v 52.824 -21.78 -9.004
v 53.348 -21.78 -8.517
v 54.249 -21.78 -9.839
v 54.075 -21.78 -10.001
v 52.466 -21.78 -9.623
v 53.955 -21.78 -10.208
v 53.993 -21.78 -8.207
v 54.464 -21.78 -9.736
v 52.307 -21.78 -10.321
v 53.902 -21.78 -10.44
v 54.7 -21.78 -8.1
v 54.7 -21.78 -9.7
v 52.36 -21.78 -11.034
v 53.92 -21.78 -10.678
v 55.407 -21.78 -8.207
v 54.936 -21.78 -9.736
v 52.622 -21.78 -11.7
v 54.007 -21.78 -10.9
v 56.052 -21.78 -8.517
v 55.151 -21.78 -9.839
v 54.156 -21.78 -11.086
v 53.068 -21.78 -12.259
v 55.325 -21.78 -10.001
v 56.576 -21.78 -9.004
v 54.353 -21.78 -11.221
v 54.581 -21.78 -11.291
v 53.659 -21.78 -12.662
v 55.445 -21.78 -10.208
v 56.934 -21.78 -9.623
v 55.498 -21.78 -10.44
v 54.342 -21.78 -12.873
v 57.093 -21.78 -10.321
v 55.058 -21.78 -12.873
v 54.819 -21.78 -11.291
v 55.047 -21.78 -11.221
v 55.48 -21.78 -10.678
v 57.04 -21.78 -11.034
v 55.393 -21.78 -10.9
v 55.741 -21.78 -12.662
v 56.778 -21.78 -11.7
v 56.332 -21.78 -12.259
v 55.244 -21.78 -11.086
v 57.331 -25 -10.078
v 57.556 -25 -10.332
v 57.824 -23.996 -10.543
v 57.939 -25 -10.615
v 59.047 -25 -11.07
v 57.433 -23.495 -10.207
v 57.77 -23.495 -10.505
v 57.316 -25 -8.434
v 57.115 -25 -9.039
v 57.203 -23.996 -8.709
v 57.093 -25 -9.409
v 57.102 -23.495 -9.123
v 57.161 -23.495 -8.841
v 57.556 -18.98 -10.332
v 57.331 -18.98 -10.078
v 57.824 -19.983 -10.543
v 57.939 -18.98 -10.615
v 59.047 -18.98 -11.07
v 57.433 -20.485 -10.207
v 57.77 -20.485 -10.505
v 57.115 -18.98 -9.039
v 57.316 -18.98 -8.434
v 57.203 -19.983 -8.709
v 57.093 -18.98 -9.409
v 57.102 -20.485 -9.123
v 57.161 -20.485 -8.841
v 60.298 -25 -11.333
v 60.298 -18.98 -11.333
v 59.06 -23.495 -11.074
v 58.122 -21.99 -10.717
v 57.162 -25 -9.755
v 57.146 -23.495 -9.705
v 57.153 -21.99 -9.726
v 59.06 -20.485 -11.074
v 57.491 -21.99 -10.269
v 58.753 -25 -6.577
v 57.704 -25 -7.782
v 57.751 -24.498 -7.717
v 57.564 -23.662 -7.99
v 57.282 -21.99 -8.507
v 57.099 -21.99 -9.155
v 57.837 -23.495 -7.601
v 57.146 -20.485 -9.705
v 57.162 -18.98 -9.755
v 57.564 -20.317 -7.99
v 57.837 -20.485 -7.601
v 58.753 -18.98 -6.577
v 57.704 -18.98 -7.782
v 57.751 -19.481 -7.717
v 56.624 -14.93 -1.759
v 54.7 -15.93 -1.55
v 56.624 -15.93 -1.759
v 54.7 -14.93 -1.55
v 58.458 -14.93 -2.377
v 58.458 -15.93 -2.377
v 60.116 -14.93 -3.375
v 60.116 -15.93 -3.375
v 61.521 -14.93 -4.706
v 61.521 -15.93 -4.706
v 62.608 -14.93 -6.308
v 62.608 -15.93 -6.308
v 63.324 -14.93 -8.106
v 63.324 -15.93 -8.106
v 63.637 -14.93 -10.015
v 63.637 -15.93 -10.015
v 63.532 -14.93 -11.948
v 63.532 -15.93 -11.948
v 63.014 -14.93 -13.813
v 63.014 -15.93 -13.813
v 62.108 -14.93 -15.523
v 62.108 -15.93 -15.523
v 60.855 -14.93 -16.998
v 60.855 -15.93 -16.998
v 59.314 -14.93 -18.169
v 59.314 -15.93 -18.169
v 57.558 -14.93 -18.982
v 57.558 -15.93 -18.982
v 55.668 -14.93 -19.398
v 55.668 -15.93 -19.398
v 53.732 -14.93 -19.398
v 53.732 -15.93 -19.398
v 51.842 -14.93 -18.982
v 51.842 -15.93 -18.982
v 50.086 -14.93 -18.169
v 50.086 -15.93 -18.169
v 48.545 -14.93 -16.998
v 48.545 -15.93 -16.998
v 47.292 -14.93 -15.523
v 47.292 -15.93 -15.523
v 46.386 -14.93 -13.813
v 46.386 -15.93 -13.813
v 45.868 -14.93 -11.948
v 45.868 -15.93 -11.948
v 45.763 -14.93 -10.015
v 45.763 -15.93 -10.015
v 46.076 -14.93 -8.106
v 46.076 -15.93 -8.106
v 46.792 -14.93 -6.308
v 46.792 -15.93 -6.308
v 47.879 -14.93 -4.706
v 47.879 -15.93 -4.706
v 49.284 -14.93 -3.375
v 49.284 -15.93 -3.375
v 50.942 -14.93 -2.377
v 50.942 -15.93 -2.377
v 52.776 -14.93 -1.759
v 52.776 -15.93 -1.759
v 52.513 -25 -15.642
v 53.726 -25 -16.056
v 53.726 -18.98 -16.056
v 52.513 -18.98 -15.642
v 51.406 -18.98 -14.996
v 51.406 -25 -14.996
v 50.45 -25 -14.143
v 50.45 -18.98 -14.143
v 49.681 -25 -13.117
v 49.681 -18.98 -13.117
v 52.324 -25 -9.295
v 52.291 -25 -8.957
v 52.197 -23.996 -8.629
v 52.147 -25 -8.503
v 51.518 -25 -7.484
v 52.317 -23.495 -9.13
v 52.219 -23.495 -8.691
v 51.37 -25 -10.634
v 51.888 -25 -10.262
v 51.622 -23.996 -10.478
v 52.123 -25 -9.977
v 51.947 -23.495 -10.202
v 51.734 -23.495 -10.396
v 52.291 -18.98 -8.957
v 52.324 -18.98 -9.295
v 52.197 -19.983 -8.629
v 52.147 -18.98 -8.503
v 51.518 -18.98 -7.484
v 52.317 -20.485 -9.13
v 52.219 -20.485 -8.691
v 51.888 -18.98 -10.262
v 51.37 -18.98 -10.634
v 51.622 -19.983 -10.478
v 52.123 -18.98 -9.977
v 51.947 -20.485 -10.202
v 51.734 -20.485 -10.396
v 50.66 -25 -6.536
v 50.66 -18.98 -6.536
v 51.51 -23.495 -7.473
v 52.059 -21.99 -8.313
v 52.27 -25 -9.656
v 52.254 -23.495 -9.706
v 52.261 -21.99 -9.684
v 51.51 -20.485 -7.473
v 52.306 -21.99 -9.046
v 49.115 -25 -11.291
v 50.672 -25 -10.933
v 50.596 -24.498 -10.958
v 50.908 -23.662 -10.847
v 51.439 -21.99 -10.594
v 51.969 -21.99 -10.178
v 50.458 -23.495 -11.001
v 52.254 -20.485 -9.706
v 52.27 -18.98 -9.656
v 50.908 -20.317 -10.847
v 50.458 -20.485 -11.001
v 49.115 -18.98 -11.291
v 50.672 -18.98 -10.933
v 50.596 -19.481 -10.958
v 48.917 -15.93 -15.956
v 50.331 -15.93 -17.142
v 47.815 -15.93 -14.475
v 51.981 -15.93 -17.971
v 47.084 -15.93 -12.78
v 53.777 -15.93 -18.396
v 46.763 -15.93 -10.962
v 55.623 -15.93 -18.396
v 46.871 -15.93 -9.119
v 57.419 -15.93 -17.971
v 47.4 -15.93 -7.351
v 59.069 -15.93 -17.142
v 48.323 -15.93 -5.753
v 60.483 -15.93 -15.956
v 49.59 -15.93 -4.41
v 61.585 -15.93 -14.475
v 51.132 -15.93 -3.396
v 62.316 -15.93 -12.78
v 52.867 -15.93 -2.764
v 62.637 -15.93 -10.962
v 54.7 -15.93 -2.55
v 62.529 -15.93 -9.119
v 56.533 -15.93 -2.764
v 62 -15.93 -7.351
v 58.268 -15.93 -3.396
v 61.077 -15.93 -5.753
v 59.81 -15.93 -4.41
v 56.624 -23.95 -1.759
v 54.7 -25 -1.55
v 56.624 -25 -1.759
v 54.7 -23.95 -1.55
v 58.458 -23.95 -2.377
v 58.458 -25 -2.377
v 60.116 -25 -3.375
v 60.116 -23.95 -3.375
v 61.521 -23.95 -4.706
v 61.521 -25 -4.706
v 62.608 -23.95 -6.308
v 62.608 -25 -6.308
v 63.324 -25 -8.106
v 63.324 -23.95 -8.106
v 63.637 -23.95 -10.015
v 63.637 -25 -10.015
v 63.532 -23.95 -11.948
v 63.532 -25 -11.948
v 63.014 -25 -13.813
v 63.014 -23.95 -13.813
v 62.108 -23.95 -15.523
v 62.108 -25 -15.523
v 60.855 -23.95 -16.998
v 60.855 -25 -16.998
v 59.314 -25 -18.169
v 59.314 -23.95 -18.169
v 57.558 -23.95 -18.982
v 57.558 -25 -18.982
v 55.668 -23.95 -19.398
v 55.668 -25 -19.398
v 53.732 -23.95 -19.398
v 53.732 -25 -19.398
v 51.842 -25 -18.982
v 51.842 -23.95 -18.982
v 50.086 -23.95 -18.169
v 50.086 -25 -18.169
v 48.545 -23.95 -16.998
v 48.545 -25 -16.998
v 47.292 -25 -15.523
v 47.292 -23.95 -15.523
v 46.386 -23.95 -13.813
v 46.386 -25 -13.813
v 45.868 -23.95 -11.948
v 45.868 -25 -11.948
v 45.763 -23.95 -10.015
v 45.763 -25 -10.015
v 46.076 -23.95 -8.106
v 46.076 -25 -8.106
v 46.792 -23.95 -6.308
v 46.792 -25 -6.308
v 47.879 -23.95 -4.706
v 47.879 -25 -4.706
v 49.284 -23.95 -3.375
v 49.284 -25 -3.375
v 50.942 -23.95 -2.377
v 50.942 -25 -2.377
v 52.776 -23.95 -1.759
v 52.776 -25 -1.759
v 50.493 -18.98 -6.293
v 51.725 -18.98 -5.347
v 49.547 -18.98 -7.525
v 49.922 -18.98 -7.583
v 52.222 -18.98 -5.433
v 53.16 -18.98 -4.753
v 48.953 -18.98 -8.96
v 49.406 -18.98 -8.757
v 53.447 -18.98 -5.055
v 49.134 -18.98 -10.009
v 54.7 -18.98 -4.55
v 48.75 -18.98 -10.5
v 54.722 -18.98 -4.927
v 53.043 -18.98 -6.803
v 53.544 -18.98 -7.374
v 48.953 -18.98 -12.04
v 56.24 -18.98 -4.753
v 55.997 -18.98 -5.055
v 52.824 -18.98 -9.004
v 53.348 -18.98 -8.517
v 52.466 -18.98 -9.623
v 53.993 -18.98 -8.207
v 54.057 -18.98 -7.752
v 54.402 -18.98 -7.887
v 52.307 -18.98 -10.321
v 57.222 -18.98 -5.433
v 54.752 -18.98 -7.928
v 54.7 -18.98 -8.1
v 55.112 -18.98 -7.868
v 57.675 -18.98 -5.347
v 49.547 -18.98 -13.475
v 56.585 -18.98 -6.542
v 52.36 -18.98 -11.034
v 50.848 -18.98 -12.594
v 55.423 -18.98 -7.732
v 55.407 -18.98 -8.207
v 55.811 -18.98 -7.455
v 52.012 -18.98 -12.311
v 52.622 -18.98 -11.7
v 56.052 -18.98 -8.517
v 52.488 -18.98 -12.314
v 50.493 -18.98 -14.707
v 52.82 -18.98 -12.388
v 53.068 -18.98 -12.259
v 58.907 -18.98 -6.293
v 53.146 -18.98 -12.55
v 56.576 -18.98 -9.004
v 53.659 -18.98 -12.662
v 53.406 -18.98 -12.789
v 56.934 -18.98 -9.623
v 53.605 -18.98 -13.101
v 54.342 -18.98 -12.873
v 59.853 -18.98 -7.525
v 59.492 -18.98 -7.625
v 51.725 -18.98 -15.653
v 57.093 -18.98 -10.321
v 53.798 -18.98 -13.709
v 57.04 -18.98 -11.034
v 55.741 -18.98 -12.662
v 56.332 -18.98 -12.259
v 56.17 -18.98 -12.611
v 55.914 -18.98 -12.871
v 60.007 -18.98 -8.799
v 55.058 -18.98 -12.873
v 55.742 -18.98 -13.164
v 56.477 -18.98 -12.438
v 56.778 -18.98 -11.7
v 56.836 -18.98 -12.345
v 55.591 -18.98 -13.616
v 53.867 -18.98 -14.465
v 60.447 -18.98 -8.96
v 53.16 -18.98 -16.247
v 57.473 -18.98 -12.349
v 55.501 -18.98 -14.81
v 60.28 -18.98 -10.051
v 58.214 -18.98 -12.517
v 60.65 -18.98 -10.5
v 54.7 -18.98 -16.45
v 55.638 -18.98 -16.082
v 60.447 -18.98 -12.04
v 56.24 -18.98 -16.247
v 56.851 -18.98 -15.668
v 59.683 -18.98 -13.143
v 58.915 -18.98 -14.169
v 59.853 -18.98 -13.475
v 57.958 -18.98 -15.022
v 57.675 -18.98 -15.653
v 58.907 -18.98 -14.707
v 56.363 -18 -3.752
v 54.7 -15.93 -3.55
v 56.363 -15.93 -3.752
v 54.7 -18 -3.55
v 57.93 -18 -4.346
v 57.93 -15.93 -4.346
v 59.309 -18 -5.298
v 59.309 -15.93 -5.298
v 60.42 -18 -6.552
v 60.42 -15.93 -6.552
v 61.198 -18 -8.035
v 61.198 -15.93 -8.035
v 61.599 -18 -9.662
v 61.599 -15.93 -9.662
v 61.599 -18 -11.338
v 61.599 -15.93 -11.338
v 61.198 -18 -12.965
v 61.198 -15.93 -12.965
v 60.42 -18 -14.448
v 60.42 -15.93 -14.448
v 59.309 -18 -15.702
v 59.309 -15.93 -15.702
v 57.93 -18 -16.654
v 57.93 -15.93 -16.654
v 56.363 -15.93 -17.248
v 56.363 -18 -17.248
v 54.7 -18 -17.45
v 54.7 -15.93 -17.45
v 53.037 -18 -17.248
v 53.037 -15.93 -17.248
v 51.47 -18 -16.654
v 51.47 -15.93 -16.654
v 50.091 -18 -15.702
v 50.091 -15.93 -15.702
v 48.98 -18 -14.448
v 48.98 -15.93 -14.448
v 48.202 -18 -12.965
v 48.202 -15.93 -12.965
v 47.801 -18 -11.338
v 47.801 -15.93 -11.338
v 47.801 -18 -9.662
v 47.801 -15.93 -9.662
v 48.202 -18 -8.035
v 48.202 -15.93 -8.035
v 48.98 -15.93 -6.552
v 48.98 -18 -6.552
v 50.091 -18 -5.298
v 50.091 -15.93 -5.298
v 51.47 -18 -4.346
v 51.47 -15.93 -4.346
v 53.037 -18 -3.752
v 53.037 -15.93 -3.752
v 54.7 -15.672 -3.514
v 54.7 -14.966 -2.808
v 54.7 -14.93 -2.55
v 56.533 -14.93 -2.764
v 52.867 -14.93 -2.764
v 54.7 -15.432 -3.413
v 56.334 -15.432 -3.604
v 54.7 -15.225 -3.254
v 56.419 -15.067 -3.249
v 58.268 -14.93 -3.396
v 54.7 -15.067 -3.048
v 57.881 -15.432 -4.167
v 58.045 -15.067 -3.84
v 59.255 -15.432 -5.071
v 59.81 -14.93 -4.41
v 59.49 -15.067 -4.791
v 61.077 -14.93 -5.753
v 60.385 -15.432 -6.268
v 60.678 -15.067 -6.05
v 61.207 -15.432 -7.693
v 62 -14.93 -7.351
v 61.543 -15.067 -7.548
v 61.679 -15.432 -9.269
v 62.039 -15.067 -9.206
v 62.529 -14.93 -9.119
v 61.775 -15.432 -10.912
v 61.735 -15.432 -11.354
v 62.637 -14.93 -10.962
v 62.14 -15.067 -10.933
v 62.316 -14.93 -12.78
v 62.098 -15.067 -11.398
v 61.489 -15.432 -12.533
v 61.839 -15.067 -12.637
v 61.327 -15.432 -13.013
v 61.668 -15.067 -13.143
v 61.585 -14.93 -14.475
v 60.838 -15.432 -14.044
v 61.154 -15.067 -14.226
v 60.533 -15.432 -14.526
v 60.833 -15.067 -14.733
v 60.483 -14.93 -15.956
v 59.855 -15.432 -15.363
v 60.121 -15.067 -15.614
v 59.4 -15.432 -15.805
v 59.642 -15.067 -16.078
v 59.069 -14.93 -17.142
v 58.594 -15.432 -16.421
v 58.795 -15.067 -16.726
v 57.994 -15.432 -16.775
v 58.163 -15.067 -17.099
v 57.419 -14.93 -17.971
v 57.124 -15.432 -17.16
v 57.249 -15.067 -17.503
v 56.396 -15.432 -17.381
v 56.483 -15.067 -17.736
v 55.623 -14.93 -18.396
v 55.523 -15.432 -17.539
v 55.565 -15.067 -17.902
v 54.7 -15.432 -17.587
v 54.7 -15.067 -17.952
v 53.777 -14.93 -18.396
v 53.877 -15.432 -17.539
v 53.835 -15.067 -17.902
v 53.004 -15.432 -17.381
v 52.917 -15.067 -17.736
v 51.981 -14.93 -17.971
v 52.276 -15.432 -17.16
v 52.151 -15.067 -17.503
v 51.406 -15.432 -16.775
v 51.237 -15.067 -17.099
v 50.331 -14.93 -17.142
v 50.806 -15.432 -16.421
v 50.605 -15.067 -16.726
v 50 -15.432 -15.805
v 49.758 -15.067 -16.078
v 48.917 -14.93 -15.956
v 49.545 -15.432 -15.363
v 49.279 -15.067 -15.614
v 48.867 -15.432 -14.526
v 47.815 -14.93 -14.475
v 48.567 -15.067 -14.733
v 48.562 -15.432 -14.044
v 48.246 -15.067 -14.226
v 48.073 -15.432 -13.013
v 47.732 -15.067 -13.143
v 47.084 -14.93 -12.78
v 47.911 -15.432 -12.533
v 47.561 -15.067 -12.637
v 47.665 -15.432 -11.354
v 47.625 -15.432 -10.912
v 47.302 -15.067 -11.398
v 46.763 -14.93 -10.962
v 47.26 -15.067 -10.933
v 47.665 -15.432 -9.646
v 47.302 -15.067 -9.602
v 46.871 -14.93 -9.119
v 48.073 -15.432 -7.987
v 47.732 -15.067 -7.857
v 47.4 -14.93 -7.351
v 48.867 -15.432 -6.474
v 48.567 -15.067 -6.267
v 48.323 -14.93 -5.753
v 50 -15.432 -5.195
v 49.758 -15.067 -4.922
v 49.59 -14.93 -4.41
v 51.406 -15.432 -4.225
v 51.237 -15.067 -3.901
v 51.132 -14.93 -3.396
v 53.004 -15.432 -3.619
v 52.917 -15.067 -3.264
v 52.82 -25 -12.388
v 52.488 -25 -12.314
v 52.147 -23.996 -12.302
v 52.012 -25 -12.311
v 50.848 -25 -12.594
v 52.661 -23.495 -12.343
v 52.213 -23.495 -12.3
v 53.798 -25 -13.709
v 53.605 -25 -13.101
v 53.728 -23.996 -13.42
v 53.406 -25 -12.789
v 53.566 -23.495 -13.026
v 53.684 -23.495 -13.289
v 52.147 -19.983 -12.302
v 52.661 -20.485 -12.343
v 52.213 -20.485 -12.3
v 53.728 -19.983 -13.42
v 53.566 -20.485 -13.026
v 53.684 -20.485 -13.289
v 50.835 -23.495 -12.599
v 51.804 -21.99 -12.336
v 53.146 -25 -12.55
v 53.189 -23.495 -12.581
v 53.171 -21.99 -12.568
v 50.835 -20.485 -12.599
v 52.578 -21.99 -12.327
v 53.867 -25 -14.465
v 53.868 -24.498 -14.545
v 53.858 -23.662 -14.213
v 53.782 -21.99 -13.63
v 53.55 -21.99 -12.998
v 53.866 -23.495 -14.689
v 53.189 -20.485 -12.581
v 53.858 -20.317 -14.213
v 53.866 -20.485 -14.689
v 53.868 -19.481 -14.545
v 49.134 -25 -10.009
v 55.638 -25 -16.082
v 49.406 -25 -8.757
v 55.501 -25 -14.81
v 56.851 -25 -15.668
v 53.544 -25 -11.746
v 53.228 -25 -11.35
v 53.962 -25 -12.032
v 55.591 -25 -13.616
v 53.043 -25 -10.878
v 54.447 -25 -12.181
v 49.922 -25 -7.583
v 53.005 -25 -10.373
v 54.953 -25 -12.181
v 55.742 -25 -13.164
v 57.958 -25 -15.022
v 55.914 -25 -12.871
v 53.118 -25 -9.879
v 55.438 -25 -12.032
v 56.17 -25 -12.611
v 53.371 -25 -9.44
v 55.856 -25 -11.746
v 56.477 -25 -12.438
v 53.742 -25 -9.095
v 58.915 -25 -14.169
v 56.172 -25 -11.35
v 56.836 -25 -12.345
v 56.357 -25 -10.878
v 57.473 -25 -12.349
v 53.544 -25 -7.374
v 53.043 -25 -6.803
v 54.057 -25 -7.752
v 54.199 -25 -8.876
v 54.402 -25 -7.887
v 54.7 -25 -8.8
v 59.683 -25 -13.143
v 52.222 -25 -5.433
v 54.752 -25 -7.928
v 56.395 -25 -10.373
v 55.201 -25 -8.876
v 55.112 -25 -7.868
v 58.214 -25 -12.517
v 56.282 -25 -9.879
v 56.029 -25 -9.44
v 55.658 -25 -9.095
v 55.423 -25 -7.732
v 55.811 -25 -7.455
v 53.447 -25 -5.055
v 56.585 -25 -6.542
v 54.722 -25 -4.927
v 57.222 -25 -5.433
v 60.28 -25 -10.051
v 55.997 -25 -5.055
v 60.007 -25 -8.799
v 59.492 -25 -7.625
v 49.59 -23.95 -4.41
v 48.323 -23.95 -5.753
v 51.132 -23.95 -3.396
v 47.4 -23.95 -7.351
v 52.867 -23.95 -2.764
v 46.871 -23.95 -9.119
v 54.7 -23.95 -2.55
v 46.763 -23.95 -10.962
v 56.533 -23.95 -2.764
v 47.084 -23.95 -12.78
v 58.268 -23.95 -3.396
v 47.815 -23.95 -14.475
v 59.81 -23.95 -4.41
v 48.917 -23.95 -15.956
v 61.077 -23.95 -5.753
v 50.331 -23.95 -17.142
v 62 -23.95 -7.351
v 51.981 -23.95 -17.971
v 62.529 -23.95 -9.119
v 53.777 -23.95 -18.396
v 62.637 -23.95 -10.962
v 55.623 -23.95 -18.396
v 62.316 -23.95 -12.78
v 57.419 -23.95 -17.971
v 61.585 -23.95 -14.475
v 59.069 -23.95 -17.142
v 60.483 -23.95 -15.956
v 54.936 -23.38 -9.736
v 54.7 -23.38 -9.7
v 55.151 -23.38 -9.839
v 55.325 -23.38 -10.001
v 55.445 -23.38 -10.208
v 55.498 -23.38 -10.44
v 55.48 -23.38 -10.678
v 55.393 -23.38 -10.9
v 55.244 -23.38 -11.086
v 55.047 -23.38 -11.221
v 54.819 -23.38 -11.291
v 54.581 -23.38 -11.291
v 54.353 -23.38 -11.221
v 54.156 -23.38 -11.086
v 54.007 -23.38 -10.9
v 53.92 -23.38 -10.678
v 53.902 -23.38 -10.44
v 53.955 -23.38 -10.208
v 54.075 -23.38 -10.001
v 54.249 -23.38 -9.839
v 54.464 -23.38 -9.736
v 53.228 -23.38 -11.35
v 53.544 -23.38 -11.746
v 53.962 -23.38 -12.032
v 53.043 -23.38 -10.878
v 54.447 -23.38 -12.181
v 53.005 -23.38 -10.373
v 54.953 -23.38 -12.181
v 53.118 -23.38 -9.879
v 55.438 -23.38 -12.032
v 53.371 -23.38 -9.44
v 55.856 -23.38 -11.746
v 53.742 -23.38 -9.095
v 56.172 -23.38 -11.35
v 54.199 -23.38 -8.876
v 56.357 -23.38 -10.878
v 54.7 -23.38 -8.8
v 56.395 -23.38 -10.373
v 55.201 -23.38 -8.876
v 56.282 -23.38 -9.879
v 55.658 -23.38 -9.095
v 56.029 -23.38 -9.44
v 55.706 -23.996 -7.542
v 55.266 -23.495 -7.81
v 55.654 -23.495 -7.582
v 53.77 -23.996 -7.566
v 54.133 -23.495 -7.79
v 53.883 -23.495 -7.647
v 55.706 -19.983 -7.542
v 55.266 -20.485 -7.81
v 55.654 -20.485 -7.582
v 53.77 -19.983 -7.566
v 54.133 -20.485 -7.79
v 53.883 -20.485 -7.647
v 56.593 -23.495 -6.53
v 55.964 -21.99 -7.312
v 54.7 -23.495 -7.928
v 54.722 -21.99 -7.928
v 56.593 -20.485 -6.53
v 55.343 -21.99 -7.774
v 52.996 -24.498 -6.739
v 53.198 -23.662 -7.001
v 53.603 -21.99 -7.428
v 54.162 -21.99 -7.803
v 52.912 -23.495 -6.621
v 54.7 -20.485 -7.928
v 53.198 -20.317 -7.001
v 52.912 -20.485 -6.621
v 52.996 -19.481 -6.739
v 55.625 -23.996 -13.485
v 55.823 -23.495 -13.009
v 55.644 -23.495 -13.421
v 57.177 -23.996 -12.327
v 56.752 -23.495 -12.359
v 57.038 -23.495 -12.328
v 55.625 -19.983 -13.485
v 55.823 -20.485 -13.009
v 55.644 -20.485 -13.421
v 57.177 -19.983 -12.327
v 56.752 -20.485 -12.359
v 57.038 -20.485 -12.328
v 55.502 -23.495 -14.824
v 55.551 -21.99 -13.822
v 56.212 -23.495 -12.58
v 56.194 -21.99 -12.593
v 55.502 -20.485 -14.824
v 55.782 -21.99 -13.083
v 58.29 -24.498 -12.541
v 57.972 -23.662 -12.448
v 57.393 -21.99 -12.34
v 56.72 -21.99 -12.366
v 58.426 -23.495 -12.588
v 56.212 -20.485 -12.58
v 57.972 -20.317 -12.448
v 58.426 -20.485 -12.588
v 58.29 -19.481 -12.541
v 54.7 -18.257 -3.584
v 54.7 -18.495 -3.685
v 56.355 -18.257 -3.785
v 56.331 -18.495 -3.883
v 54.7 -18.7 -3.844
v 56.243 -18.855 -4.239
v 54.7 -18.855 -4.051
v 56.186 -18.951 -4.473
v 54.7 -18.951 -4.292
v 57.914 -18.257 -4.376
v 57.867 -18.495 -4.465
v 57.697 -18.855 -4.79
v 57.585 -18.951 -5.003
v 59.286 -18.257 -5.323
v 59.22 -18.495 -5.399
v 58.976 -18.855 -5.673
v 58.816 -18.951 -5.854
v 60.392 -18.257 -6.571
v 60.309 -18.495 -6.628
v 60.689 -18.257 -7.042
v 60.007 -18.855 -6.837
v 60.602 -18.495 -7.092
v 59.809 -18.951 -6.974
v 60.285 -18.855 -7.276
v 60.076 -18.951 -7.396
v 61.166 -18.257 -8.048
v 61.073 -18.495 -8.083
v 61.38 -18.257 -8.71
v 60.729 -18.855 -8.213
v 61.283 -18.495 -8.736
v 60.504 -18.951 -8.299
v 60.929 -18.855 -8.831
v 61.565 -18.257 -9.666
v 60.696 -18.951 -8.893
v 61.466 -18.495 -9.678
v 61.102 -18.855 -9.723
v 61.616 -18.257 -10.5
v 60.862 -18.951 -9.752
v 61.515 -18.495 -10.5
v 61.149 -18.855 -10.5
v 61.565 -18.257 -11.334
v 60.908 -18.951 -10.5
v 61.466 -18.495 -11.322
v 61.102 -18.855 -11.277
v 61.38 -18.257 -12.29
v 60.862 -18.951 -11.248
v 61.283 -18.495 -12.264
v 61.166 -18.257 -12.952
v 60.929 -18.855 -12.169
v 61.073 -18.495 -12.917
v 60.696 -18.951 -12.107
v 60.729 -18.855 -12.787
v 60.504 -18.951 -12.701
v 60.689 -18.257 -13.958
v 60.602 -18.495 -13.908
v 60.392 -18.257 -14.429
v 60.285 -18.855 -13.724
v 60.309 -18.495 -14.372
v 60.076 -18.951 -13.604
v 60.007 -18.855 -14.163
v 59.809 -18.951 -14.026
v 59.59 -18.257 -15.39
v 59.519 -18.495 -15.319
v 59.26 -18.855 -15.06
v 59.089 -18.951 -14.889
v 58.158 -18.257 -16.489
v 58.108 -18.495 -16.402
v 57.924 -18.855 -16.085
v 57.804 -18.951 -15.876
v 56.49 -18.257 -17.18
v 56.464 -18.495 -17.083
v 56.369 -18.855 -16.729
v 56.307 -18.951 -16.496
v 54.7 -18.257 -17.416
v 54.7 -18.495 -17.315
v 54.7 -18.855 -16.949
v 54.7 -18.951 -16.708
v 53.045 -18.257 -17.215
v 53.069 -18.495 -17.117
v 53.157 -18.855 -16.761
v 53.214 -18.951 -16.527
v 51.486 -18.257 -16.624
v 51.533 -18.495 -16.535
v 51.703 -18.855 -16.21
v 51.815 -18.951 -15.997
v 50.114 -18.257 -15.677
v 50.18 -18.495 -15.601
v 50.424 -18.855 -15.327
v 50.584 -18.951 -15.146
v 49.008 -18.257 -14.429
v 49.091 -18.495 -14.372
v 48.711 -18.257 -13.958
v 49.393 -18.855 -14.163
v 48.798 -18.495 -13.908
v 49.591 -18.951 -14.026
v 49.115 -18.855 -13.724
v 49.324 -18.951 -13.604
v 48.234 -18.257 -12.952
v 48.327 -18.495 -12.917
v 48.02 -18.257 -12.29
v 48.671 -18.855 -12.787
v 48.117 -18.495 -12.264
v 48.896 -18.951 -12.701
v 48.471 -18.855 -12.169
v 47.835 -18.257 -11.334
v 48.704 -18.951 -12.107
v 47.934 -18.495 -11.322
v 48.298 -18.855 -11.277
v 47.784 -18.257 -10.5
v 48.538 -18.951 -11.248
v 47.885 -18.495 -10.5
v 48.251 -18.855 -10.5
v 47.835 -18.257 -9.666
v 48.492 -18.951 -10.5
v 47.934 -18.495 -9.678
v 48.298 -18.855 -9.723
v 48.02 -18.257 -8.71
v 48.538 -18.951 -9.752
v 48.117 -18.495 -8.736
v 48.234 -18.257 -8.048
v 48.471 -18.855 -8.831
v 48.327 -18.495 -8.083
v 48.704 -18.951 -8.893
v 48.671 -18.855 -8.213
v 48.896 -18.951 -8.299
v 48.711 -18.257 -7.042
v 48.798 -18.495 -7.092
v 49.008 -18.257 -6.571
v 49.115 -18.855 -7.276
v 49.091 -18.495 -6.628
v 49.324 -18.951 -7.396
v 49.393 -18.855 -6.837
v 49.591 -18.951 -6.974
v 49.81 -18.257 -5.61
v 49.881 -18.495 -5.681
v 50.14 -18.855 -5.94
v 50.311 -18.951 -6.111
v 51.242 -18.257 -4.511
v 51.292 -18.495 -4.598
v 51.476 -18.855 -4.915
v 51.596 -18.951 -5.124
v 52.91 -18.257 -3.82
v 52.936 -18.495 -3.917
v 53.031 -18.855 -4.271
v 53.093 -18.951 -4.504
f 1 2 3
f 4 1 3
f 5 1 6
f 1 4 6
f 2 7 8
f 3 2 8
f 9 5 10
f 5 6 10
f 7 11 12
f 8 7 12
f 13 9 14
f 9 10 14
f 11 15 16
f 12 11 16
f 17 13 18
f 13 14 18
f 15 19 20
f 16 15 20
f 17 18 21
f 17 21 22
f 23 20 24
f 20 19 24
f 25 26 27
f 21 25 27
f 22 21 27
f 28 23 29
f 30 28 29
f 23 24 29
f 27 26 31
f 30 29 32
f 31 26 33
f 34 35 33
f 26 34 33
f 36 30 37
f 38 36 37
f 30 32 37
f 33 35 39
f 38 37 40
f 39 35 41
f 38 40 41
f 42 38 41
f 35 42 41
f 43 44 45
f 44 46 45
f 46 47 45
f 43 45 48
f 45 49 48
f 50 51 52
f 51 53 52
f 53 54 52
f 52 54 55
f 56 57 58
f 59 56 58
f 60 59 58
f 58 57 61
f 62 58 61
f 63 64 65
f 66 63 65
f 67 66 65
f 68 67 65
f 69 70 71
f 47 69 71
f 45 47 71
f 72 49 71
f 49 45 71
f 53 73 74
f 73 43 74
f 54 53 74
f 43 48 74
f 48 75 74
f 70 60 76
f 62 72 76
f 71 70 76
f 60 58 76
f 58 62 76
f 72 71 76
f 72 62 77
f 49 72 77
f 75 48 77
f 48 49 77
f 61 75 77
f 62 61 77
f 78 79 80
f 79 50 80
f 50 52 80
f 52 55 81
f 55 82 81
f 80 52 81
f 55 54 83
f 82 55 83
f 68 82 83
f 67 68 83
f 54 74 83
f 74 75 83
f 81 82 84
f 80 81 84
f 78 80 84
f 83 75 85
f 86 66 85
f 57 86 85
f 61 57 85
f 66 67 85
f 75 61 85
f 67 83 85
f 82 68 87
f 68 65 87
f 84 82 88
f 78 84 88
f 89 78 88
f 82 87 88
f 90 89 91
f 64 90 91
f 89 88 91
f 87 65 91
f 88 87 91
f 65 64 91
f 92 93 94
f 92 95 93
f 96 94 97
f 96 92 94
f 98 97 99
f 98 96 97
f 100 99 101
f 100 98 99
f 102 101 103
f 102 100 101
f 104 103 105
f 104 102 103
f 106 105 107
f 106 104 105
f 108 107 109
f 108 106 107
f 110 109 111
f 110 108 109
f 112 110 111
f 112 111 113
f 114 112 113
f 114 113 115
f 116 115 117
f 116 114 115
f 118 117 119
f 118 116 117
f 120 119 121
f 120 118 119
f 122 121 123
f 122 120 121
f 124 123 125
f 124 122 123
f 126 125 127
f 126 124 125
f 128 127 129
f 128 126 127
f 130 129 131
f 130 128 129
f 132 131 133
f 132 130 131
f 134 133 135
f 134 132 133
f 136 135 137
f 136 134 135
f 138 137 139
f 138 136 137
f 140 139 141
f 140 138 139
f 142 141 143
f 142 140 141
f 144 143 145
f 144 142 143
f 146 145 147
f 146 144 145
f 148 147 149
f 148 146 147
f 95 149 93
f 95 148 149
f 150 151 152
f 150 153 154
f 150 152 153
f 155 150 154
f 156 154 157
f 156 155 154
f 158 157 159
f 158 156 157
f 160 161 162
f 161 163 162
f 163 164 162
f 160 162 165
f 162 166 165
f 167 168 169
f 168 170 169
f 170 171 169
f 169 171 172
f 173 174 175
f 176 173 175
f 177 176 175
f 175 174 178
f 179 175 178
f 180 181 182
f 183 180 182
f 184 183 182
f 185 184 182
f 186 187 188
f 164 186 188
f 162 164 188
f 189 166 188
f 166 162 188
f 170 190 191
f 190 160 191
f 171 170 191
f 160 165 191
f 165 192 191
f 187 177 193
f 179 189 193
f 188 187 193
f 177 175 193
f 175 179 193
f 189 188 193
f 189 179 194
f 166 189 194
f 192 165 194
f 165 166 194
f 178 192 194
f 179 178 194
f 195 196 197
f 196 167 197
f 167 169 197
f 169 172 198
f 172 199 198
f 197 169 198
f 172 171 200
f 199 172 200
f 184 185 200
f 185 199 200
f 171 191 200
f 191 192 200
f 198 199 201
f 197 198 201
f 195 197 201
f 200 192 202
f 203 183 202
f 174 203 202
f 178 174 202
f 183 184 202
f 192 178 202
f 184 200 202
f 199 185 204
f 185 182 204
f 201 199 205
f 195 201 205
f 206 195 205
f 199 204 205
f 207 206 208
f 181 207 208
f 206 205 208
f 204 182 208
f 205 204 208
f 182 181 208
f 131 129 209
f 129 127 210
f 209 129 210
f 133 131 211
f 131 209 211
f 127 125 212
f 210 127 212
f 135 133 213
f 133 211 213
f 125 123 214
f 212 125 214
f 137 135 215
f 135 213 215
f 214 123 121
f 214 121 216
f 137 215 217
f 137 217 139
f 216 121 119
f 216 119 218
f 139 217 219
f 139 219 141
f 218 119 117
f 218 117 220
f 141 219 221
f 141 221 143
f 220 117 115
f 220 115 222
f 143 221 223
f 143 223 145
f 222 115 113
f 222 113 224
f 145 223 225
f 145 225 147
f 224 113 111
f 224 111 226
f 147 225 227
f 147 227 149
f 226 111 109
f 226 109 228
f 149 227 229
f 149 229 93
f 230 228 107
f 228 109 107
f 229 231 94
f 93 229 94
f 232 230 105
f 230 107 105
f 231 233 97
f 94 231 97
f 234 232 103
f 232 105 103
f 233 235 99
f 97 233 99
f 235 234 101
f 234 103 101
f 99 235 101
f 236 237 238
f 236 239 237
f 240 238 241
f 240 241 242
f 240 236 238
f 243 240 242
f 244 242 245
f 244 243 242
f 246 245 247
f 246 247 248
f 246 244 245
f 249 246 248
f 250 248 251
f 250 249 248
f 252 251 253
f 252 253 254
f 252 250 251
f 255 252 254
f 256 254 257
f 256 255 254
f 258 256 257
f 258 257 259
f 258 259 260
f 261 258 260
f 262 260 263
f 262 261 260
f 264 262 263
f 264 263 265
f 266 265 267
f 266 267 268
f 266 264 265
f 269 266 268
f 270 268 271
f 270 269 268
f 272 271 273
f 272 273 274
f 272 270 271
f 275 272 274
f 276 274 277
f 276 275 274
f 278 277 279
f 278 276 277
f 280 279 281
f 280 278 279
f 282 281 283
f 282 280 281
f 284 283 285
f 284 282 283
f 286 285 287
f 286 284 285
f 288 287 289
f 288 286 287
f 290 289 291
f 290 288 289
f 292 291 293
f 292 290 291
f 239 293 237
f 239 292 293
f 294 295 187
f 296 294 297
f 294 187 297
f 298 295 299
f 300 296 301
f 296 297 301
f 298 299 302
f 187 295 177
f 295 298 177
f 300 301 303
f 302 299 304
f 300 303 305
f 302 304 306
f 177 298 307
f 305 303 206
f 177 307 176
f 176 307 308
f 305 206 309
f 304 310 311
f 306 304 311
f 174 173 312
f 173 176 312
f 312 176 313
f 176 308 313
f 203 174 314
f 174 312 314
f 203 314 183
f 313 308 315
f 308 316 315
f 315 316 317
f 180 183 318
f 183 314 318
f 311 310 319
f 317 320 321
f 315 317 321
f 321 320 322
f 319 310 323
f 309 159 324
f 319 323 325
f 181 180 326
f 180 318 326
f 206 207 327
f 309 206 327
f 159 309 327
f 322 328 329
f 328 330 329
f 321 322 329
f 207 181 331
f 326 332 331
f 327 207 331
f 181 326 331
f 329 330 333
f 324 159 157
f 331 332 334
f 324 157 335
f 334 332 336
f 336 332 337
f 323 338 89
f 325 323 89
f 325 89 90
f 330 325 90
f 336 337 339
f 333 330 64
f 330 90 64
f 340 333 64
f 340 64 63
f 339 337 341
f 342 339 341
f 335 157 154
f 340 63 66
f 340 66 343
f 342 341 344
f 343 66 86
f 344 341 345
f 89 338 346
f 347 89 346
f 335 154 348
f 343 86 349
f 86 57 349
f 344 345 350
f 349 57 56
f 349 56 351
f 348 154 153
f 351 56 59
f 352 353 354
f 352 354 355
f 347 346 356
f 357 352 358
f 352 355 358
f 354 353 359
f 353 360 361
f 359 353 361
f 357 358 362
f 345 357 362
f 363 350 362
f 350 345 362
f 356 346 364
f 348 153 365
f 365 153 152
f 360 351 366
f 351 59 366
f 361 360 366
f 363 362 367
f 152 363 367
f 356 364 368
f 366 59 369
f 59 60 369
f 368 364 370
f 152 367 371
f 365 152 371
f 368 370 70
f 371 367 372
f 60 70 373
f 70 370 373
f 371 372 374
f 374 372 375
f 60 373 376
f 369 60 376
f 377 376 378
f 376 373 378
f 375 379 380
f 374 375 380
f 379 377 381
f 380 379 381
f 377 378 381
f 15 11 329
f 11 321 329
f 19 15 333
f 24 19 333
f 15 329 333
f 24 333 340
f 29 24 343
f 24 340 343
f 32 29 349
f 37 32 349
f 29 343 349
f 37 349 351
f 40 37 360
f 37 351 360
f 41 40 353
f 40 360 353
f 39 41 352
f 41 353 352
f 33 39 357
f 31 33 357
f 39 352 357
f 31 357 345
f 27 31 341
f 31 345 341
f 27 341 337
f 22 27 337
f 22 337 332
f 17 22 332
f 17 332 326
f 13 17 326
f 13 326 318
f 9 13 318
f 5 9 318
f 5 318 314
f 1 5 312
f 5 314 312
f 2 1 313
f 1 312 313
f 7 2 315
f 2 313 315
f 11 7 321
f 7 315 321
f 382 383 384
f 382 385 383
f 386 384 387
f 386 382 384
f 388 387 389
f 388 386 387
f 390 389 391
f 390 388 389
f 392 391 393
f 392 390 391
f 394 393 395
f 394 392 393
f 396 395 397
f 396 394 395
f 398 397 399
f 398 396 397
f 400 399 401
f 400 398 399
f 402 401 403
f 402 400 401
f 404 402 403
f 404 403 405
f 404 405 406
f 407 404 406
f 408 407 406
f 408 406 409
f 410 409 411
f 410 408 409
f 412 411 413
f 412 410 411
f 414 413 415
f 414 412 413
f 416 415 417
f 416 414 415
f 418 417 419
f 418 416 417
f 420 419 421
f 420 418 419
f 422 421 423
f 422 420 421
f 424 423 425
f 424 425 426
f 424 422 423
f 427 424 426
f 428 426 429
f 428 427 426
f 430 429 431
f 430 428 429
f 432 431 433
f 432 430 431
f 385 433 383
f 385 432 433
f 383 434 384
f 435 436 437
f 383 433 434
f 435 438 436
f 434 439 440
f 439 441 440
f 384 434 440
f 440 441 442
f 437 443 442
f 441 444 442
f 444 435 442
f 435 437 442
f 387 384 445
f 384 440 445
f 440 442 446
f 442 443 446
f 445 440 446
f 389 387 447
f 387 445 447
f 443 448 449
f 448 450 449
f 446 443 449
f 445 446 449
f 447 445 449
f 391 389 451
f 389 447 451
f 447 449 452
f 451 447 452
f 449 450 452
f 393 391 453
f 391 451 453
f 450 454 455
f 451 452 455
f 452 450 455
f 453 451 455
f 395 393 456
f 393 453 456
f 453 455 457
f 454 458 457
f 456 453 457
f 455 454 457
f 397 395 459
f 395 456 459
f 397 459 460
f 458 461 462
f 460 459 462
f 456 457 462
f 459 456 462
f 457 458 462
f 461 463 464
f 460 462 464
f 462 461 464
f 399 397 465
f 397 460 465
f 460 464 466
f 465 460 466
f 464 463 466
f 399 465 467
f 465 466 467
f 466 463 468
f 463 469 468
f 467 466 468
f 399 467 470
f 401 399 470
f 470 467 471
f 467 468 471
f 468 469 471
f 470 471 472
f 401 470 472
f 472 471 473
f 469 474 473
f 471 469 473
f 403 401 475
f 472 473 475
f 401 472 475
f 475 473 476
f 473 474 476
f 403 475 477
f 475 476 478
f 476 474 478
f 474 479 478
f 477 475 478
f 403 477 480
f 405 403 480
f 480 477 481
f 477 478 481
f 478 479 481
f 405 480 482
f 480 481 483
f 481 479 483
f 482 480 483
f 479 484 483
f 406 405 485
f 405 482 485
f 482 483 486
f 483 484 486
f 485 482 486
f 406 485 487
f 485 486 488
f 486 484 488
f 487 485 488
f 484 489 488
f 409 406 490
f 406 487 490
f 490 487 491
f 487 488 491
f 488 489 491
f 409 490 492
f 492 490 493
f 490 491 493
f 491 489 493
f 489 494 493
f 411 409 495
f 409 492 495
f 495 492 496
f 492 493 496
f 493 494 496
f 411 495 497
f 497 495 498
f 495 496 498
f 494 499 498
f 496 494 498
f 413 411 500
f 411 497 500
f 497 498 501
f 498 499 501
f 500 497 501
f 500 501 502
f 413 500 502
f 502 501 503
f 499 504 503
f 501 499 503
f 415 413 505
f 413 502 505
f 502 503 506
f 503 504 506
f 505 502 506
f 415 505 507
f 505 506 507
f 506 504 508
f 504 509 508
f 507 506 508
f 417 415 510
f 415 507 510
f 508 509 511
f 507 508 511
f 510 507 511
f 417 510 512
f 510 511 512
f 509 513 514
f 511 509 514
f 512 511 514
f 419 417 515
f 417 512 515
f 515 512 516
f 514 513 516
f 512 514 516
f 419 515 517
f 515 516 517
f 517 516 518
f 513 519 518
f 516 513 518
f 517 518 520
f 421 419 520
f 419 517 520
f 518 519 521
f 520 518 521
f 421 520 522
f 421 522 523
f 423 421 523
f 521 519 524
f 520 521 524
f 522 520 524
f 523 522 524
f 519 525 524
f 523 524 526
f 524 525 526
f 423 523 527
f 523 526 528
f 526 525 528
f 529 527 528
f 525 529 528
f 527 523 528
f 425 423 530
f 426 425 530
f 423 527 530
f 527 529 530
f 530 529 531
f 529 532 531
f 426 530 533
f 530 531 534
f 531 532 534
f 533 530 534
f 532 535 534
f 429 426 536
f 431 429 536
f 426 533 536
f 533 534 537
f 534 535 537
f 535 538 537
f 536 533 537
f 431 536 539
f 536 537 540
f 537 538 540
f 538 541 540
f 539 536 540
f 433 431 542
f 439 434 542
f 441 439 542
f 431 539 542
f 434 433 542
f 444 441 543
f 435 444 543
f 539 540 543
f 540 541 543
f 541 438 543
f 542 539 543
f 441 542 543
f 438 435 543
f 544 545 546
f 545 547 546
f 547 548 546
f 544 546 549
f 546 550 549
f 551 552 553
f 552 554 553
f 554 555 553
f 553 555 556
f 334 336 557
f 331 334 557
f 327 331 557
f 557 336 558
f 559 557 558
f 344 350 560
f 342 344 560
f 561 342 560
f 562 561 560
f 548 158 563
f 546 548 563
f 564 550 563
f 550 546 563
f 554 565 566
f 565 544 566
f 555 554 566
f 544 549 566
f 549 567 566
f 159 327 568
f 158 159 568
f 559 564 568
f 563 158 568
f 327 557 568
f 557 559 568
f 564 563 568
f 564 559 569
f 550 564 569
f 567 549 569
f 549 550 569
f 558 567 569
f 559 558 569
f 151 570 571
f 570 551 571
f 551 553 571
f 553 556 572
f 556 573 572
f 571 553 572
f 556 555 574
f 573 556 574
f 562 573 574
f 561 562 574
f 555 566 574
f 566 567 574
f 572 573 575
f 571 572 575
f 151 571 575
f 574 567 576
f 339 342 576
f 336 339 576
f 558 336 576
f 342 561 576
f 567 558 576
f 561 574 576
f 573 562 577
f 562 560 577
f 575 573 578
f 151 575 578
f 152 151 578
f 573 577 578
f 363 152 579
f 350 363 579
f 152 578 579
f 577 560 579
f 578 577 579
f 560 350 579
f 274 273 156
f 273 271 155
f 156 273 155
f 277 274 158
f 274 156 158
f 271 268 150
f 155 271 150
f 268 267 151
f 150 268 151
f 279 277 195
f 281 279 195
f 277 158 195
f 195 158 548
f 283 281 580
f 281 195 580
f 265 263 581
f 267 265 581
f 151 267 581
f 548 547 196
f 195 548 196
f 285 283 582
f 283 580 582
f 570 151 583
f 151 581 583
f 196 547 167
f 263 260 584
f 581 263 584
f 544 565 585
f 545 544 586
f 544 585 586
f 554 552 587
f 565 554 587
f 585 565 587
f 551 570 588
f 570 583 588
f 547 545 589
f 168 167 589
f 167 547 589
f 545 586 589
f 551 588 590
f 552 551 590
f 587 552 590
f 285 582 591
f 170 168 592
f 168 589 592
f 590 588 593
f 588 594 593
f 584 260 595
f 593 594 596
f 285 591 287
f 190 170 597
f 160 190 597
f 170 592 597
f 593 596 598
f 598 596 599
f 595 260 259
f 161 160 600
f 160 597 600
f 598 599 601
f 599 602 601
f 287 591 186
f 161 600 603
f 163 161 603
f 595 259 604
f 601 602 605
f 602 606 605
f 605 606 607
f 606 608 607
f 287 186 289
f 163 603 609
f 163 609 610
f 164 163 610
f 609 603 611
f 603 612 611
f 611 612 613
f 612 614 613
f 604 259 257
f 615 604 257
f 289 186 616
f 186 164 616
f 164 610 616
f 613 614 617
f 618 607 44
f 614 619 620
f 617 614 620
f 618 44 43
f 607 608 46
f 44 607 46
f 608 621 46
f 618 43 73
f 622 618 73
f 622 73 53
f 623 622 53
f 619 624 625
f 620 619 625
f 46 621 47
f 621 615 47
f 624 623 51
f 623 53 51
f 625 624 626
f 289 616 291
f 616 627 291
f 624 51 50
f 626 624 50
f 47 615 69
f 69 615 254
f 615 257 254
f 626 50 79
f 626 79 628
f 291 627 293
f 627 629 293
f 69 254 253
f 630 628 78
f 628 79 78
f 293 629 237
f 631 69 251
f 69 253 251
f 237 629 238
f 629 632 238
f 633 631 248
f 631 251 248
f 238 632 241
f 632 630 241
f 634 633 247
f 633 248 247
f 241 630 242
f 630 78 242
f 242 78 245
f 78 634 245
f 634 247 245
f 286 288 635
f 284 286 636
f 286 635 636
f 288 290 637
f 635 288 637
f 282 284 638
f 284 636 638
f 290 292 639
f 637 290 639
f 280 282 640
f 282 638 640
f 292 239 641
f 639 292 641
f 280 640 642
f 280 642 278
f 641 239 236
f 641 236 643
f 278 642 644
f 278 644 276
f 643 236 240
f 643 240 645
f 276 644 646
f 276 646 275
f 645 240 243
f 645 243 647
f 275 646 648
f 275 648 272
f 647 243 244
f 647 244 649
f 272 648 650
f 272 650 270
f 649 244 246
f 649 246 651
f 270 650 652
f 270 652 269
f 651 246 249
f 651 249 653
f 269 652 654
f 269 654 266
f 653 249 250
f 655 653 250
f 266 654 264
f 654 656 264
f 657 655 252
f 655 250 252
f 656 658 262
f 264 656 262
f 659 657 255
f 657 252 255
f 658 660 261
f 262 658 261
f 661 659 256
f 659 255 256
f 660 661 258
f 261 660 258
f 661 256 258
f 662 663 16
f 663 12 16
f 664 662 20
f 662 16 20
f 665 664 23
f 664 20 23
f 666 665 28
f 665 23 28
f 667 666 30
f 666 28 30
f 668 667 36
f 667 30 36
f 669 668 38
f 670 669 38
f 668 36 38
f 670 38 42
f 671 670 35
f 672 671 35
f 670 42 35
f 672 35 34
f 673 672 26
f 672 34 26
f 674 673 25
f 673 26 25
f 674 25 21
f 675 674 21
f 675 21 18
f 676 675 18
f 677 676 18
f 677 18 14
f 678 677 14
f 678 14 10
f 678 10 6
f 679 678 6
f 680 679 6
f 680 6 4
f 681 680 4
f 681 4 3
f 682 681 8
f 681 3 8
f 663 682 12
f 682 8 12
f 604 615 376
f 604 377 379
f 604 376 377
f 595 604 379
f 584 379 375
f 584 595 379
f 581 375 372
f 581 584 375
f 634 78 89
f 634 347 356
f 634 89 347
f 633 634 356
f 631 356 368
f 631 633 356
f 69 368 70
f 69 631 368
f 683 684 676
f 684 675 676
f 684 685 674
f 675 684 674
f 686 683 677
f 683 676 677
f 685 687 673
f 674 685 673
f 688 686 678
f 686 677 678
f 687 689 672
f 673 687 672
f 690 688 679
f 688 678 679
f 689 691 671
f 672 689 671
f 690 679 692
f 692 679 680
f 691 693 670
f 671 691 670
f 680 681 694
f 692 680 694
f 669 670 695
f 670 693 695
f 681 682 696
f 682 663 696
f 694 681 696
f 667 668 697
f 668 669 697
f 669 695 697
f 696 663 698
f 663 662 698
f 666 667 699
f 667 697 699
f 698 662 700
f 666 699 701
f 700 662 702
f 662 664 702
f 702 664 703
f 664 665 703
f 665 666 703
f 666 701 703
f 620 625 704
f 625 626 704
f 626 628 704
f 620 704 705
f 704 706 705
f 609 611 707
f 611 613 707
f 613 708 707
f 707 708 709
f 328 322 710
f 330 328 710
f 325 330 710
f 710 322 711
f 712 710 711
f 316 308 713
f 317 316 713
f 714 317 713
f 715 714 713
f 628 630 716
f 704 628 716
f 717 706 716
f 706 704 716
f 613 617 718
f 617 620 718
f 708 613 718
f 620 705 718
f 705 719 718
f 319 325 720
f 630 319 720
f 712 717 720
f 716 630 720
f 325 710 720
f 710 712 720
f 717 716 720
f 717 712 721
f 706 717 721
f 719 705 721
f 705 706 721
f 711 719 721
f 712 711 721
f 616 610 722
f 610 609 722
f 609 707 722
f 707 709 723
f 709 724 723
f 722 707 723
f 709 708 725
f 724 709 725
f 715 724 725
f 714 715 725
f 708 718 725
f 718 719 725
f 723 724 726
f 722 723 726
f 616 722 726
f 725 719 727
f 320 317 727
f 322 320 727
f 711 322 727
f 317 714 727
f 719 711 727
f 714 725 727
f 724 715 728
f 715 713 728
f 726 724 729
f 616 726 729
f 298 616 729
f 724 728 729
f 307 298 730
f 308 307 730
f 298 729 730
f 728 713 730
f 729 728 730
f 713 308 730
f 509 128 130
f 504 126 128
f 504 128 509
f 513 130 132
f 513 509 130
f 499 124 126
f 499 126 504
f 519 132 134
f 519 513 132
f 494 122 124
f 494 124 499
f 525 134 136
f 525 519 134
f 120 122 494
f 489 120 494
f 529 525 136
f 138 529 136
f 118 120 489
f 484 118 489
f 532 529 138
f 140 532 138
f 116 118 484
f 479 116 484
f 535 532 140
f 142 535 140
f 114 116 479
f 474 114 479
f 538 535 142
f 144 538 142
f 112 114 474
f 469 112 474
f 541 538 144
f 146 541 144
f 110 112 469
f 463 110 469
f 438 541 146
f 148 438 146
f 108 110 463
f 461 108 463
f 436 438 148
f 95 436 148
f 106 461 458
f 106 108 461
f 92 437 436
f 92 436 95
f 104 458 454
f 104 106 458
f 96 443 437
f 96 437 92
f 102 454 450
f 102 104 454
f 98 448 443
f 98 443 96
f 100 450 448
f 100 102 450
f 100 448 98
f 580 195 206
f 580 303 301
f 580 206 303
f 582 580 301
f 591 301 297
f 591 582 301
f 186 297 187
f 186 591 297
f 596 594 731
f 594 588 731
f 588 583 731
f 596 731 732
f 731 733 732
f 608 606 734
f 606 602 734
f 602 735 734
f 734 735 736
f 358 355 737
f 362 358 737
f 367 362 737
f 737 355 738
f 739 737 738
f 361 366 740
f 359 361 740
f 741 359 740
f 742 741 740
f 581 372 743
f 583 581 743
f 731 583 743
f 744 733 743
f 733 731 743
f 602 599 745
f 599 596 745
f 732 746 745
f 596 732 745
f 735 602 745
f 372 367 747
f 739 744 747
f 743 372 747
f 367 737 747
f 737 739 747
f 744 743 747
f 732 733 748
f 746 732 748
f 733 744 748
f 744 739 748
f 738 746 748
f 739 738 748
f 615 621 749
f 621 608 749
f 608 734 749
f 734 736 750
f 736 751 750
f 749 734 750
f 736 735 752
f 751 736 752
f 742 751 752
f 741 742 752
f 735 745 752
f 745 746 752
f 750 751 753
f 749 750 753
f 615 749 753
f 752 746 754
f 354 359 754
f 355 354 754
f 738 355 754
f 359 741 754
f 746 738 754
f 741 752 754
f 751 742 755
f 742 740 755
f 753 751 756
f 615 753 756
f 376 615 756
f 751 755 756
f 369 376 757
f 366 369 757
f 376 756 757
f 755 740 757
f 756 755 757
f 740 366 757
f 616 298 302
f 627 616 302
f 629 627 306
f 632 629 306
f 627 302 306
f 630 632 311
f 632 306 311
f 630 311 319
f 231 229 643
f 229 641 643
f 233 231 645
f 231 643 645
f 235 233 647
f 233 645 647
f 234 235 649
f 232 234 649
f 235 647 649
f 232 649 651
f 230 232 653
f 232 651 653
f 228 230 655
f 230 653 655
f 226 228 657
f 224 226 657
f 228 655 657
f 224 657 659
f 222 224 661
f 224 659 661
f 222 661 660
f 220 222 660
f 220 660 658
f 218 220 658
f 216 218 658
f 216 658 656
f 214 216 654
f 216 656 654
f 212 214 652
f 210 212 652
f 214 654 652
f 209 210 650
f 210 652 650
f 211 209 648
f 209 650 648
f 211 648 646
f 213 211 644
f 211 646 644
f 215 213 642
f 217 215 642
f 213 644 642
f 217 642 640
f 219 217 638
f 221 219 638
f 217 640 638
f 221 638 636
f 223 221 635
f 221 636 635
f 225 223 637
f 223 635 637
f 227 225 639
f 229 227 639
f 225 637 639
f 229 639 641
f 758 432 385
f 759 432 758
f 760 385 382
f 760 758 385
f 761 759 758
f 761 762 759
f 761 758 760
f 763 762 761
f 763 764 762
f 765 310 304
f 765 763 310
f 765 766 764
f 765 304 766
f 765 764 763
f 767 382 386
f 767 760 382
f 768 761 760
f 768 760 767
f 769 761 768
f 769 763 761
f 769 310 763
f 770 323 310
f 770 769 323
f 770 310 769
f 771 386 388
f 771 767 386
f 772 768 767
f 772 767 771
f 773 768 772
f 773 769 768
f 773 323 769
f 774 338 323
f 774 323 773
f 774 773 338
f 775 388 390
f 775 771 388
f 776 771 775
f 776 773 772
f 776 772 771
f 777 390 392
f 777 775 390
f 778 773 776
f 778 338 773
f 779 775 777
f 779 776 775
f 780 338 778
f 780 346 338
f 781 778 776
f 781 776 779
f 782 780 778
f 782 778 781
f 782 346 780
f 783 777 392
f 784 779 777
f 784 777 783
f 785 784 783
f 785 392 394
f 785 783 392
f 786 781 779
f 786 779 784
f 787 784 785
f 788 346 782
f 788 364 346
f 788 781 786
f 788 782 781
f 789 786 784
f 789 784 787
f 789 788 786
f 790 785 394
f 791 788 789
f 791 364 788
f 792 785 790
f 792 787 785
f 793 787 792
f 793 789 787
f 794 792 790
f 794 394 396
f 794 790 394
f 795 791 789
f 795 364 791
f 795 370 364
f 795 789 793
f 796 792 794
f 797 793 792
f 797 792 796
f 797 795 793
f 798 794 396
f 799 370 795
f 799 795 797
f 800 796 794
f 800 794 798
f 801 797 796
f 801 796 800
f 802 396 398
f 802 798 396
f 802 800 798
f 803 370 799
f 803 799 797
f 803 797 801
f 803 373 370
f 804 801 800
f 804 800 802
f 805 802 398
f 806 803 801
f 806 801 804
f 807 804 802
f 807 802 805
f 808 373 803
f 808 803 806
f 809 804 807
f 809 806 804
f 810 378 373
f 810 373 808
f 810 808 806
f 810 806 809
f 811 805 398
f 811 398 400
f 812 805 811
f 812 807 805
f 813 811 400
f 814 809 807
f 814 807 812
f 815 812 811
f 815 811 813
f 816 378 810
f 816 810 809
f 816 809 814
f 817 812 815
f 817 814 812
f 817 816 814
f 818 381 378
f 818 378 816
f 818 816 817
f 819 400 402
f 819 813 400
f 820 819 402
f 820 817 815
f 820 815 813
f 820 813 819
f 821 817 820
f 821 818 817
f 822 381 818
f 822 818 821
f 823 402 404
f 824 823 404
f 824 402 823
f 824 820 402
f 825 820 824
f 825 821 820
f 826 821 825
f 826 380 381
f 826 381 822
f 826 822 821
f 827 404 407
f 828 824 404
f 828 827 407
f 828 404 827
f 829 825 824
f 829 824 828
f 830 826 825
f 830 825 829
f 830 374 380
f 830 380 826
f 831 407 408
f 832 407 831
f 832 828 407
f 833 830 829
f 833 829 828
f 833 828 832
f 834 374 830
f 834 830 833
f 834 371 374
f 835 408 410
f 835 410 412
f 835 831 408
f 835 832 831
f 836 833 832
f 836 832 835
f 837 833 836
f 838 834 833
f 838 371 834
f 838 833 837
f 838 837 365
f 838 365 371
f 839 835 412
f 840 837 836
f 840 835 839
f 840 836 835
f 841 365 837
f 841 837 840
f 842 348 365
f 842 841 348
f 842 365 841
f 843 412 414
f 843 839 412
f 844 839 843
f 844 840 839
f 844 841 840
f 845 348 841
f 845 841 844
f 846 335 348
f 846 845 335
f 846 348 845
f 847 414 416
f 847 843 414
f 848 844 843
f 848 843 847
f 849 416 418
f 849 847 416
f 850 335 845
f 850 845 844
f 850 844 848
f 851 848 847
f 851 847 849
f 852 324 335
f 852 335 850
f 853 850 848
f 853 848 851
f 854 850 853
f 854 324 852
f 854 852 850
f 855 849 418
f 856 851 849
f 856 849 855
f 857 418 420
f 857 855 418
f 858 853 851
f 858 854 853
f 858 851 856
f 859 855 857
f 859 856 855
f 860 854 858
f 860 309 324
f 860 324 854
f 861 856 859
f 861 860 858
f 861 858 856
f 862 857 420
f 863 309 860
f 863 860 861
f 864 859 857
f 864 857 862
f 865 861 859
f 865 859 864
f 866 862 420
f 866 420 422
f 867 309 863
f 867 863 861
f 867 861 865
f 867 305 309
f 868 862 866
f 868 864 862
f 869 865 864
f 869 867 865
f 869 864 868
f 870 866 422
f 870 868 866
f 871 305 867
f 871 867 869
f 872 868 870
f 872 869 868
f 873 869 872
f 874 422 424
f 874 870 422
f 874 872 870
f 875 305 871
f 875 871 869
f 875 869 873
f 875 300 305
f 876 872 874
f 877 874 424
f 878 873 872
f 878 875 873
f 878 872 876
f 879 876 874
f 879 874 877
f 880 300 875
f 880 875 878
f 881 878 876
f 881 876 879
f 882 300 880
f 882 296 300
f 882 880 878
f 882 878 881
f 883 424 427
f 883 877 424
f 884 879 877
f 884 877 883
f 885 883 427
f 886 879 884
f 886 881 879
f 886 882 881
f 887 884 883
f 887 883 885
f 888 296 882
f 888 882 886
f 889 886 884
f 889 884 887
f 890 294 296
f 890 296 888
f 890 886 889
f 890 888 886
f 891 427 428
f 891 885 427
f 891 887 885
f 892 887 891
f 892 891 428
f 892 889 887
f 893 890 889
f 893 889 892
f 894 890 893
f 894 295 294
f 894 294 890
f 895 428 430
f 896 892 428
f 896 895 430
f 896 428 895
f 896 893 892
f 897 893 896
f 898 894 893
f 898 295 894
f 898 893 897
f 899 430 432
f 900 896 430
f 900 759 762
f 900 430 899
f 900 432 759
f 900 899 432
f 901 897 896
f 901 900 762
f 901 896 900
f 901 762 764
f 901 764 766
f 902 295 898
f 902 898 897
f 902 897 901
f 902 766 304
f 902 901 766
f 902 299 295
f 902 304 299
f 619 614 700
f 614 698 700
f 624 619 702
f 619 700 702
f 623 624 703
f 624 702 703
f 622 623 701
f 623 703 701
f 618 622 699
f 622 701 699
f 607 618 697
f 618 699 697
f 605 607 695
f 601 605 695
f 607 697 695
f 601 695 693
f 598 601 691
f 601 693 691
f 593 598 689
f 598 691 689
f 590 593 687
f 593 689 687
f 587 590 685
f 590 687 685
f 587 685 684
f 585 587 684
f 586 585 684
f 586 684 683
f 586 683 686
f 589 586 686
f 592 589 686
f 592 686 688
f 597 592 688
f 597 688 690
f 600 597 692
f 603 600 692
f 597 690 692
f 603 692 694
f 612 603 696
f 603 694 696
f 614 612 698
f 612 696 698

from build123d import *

# Parameters (mm, degrees)
POCKET001_DEPTH       = 54.489273
POCKET001_DEPTH_BACK  = 86.48894
POLARPATTERN001_COUNT = 5


with BuildPart() as part:
    # Sketch024 → Revolution001 (revolve)
    with BuildSketch(Plane.YZ):
        with BuildLine():
            Line((-31.999667, 8.950126), (-30.949667, 8.950126))
            Line((-30.949667, 7.950126), (-30.949667, 8.950126))
            Line((-22.929667, 7.950126), (-30.949667, 7.950126))
            Line((-22.929667, 8.950126), (-22.929667, 7.950126))
            Line((-22.929667, 8.950126), (-21.929667, 8.950126))
            Line((-21.929667, 8.950126), (-21.929667, 7.950126))
            ThreePointArc((-22.929667, 6.950126), (-22.225454, 7.245913), (-21.929667, 7.950126))
            Line((-22.929667, 6.950126), (-24.999667, 6.950126))
            ThreePointArc((-24.999667, 6.950126), (-25.699738, 6.655996), (-25.979667, 5.950126))
            Line((-25.979667, 2.4), (-25.979667, 5.950126))
            Line((-28.779667, 2.4), (-25.979667, 2.4))
            Line((-28.779667, 0.8), (-28.779667, 2.4))
            Line((-30.379667, 0.8), (-28.779667, 0.8))
            Line((-30.379667, 1.7), (-30.379667, 0.8))
            Line((-31.999667, 1.7), (-30.379667, 1.7))
            Line((-31.999667, 8.950126), (-31.999667, 1.7))
        make_face()
    revolve(axis=Axis((0, 0, 0), (0, 1, 0)))

    # Sketch025 → Pocket001 (cut, two sides)
    with BuildSketch(Plane(origin=(-5.2, 0, 0), x_dir=(1, 0, 0), z_dir=(0, -1, 0))) as pocket001_sk:
        with BuildLine():
            add(Edge.make_bspline(
                [(7.722002, 5.067158), (5.222002, 0.076099), (2.722002, 5.067158)],
                knots=[-2.5, -2.5, -2.5, 2.5, 2.5, 2.5], degree=2))
            ThreePointArc((2.722002, 5.067158), (5.222002, 5.573306), (7.722002, 5.067158))
        make_face()
    pocket001 = extrude(amount=-POCKET001_DEPTH, mode=Mode.SUBTRACT) + extrude(pocket001_sk.sketch, amount=POCKET001_DEPTH_BACK, mode=Mode.SUBTRACT)

    # PolarPattern001: Pocket001 ×5 about axis
    polarpattern001_axis = Axis((0, 0, 0), (0, 1, 0))
    for i in range(1, POLARPATTERN001_COUNT):
        add(pocket001.rotate(polarpattern001_axis, i * 360 / POLARPATTERN001_COUNT), mode=Mode.SUBTRACT)


with BuildPart() as part_1:
    # Body021 placement: moved
    add(part.part.moved(Location((54.7, 7, -10.5))))


solid = part_1.part
